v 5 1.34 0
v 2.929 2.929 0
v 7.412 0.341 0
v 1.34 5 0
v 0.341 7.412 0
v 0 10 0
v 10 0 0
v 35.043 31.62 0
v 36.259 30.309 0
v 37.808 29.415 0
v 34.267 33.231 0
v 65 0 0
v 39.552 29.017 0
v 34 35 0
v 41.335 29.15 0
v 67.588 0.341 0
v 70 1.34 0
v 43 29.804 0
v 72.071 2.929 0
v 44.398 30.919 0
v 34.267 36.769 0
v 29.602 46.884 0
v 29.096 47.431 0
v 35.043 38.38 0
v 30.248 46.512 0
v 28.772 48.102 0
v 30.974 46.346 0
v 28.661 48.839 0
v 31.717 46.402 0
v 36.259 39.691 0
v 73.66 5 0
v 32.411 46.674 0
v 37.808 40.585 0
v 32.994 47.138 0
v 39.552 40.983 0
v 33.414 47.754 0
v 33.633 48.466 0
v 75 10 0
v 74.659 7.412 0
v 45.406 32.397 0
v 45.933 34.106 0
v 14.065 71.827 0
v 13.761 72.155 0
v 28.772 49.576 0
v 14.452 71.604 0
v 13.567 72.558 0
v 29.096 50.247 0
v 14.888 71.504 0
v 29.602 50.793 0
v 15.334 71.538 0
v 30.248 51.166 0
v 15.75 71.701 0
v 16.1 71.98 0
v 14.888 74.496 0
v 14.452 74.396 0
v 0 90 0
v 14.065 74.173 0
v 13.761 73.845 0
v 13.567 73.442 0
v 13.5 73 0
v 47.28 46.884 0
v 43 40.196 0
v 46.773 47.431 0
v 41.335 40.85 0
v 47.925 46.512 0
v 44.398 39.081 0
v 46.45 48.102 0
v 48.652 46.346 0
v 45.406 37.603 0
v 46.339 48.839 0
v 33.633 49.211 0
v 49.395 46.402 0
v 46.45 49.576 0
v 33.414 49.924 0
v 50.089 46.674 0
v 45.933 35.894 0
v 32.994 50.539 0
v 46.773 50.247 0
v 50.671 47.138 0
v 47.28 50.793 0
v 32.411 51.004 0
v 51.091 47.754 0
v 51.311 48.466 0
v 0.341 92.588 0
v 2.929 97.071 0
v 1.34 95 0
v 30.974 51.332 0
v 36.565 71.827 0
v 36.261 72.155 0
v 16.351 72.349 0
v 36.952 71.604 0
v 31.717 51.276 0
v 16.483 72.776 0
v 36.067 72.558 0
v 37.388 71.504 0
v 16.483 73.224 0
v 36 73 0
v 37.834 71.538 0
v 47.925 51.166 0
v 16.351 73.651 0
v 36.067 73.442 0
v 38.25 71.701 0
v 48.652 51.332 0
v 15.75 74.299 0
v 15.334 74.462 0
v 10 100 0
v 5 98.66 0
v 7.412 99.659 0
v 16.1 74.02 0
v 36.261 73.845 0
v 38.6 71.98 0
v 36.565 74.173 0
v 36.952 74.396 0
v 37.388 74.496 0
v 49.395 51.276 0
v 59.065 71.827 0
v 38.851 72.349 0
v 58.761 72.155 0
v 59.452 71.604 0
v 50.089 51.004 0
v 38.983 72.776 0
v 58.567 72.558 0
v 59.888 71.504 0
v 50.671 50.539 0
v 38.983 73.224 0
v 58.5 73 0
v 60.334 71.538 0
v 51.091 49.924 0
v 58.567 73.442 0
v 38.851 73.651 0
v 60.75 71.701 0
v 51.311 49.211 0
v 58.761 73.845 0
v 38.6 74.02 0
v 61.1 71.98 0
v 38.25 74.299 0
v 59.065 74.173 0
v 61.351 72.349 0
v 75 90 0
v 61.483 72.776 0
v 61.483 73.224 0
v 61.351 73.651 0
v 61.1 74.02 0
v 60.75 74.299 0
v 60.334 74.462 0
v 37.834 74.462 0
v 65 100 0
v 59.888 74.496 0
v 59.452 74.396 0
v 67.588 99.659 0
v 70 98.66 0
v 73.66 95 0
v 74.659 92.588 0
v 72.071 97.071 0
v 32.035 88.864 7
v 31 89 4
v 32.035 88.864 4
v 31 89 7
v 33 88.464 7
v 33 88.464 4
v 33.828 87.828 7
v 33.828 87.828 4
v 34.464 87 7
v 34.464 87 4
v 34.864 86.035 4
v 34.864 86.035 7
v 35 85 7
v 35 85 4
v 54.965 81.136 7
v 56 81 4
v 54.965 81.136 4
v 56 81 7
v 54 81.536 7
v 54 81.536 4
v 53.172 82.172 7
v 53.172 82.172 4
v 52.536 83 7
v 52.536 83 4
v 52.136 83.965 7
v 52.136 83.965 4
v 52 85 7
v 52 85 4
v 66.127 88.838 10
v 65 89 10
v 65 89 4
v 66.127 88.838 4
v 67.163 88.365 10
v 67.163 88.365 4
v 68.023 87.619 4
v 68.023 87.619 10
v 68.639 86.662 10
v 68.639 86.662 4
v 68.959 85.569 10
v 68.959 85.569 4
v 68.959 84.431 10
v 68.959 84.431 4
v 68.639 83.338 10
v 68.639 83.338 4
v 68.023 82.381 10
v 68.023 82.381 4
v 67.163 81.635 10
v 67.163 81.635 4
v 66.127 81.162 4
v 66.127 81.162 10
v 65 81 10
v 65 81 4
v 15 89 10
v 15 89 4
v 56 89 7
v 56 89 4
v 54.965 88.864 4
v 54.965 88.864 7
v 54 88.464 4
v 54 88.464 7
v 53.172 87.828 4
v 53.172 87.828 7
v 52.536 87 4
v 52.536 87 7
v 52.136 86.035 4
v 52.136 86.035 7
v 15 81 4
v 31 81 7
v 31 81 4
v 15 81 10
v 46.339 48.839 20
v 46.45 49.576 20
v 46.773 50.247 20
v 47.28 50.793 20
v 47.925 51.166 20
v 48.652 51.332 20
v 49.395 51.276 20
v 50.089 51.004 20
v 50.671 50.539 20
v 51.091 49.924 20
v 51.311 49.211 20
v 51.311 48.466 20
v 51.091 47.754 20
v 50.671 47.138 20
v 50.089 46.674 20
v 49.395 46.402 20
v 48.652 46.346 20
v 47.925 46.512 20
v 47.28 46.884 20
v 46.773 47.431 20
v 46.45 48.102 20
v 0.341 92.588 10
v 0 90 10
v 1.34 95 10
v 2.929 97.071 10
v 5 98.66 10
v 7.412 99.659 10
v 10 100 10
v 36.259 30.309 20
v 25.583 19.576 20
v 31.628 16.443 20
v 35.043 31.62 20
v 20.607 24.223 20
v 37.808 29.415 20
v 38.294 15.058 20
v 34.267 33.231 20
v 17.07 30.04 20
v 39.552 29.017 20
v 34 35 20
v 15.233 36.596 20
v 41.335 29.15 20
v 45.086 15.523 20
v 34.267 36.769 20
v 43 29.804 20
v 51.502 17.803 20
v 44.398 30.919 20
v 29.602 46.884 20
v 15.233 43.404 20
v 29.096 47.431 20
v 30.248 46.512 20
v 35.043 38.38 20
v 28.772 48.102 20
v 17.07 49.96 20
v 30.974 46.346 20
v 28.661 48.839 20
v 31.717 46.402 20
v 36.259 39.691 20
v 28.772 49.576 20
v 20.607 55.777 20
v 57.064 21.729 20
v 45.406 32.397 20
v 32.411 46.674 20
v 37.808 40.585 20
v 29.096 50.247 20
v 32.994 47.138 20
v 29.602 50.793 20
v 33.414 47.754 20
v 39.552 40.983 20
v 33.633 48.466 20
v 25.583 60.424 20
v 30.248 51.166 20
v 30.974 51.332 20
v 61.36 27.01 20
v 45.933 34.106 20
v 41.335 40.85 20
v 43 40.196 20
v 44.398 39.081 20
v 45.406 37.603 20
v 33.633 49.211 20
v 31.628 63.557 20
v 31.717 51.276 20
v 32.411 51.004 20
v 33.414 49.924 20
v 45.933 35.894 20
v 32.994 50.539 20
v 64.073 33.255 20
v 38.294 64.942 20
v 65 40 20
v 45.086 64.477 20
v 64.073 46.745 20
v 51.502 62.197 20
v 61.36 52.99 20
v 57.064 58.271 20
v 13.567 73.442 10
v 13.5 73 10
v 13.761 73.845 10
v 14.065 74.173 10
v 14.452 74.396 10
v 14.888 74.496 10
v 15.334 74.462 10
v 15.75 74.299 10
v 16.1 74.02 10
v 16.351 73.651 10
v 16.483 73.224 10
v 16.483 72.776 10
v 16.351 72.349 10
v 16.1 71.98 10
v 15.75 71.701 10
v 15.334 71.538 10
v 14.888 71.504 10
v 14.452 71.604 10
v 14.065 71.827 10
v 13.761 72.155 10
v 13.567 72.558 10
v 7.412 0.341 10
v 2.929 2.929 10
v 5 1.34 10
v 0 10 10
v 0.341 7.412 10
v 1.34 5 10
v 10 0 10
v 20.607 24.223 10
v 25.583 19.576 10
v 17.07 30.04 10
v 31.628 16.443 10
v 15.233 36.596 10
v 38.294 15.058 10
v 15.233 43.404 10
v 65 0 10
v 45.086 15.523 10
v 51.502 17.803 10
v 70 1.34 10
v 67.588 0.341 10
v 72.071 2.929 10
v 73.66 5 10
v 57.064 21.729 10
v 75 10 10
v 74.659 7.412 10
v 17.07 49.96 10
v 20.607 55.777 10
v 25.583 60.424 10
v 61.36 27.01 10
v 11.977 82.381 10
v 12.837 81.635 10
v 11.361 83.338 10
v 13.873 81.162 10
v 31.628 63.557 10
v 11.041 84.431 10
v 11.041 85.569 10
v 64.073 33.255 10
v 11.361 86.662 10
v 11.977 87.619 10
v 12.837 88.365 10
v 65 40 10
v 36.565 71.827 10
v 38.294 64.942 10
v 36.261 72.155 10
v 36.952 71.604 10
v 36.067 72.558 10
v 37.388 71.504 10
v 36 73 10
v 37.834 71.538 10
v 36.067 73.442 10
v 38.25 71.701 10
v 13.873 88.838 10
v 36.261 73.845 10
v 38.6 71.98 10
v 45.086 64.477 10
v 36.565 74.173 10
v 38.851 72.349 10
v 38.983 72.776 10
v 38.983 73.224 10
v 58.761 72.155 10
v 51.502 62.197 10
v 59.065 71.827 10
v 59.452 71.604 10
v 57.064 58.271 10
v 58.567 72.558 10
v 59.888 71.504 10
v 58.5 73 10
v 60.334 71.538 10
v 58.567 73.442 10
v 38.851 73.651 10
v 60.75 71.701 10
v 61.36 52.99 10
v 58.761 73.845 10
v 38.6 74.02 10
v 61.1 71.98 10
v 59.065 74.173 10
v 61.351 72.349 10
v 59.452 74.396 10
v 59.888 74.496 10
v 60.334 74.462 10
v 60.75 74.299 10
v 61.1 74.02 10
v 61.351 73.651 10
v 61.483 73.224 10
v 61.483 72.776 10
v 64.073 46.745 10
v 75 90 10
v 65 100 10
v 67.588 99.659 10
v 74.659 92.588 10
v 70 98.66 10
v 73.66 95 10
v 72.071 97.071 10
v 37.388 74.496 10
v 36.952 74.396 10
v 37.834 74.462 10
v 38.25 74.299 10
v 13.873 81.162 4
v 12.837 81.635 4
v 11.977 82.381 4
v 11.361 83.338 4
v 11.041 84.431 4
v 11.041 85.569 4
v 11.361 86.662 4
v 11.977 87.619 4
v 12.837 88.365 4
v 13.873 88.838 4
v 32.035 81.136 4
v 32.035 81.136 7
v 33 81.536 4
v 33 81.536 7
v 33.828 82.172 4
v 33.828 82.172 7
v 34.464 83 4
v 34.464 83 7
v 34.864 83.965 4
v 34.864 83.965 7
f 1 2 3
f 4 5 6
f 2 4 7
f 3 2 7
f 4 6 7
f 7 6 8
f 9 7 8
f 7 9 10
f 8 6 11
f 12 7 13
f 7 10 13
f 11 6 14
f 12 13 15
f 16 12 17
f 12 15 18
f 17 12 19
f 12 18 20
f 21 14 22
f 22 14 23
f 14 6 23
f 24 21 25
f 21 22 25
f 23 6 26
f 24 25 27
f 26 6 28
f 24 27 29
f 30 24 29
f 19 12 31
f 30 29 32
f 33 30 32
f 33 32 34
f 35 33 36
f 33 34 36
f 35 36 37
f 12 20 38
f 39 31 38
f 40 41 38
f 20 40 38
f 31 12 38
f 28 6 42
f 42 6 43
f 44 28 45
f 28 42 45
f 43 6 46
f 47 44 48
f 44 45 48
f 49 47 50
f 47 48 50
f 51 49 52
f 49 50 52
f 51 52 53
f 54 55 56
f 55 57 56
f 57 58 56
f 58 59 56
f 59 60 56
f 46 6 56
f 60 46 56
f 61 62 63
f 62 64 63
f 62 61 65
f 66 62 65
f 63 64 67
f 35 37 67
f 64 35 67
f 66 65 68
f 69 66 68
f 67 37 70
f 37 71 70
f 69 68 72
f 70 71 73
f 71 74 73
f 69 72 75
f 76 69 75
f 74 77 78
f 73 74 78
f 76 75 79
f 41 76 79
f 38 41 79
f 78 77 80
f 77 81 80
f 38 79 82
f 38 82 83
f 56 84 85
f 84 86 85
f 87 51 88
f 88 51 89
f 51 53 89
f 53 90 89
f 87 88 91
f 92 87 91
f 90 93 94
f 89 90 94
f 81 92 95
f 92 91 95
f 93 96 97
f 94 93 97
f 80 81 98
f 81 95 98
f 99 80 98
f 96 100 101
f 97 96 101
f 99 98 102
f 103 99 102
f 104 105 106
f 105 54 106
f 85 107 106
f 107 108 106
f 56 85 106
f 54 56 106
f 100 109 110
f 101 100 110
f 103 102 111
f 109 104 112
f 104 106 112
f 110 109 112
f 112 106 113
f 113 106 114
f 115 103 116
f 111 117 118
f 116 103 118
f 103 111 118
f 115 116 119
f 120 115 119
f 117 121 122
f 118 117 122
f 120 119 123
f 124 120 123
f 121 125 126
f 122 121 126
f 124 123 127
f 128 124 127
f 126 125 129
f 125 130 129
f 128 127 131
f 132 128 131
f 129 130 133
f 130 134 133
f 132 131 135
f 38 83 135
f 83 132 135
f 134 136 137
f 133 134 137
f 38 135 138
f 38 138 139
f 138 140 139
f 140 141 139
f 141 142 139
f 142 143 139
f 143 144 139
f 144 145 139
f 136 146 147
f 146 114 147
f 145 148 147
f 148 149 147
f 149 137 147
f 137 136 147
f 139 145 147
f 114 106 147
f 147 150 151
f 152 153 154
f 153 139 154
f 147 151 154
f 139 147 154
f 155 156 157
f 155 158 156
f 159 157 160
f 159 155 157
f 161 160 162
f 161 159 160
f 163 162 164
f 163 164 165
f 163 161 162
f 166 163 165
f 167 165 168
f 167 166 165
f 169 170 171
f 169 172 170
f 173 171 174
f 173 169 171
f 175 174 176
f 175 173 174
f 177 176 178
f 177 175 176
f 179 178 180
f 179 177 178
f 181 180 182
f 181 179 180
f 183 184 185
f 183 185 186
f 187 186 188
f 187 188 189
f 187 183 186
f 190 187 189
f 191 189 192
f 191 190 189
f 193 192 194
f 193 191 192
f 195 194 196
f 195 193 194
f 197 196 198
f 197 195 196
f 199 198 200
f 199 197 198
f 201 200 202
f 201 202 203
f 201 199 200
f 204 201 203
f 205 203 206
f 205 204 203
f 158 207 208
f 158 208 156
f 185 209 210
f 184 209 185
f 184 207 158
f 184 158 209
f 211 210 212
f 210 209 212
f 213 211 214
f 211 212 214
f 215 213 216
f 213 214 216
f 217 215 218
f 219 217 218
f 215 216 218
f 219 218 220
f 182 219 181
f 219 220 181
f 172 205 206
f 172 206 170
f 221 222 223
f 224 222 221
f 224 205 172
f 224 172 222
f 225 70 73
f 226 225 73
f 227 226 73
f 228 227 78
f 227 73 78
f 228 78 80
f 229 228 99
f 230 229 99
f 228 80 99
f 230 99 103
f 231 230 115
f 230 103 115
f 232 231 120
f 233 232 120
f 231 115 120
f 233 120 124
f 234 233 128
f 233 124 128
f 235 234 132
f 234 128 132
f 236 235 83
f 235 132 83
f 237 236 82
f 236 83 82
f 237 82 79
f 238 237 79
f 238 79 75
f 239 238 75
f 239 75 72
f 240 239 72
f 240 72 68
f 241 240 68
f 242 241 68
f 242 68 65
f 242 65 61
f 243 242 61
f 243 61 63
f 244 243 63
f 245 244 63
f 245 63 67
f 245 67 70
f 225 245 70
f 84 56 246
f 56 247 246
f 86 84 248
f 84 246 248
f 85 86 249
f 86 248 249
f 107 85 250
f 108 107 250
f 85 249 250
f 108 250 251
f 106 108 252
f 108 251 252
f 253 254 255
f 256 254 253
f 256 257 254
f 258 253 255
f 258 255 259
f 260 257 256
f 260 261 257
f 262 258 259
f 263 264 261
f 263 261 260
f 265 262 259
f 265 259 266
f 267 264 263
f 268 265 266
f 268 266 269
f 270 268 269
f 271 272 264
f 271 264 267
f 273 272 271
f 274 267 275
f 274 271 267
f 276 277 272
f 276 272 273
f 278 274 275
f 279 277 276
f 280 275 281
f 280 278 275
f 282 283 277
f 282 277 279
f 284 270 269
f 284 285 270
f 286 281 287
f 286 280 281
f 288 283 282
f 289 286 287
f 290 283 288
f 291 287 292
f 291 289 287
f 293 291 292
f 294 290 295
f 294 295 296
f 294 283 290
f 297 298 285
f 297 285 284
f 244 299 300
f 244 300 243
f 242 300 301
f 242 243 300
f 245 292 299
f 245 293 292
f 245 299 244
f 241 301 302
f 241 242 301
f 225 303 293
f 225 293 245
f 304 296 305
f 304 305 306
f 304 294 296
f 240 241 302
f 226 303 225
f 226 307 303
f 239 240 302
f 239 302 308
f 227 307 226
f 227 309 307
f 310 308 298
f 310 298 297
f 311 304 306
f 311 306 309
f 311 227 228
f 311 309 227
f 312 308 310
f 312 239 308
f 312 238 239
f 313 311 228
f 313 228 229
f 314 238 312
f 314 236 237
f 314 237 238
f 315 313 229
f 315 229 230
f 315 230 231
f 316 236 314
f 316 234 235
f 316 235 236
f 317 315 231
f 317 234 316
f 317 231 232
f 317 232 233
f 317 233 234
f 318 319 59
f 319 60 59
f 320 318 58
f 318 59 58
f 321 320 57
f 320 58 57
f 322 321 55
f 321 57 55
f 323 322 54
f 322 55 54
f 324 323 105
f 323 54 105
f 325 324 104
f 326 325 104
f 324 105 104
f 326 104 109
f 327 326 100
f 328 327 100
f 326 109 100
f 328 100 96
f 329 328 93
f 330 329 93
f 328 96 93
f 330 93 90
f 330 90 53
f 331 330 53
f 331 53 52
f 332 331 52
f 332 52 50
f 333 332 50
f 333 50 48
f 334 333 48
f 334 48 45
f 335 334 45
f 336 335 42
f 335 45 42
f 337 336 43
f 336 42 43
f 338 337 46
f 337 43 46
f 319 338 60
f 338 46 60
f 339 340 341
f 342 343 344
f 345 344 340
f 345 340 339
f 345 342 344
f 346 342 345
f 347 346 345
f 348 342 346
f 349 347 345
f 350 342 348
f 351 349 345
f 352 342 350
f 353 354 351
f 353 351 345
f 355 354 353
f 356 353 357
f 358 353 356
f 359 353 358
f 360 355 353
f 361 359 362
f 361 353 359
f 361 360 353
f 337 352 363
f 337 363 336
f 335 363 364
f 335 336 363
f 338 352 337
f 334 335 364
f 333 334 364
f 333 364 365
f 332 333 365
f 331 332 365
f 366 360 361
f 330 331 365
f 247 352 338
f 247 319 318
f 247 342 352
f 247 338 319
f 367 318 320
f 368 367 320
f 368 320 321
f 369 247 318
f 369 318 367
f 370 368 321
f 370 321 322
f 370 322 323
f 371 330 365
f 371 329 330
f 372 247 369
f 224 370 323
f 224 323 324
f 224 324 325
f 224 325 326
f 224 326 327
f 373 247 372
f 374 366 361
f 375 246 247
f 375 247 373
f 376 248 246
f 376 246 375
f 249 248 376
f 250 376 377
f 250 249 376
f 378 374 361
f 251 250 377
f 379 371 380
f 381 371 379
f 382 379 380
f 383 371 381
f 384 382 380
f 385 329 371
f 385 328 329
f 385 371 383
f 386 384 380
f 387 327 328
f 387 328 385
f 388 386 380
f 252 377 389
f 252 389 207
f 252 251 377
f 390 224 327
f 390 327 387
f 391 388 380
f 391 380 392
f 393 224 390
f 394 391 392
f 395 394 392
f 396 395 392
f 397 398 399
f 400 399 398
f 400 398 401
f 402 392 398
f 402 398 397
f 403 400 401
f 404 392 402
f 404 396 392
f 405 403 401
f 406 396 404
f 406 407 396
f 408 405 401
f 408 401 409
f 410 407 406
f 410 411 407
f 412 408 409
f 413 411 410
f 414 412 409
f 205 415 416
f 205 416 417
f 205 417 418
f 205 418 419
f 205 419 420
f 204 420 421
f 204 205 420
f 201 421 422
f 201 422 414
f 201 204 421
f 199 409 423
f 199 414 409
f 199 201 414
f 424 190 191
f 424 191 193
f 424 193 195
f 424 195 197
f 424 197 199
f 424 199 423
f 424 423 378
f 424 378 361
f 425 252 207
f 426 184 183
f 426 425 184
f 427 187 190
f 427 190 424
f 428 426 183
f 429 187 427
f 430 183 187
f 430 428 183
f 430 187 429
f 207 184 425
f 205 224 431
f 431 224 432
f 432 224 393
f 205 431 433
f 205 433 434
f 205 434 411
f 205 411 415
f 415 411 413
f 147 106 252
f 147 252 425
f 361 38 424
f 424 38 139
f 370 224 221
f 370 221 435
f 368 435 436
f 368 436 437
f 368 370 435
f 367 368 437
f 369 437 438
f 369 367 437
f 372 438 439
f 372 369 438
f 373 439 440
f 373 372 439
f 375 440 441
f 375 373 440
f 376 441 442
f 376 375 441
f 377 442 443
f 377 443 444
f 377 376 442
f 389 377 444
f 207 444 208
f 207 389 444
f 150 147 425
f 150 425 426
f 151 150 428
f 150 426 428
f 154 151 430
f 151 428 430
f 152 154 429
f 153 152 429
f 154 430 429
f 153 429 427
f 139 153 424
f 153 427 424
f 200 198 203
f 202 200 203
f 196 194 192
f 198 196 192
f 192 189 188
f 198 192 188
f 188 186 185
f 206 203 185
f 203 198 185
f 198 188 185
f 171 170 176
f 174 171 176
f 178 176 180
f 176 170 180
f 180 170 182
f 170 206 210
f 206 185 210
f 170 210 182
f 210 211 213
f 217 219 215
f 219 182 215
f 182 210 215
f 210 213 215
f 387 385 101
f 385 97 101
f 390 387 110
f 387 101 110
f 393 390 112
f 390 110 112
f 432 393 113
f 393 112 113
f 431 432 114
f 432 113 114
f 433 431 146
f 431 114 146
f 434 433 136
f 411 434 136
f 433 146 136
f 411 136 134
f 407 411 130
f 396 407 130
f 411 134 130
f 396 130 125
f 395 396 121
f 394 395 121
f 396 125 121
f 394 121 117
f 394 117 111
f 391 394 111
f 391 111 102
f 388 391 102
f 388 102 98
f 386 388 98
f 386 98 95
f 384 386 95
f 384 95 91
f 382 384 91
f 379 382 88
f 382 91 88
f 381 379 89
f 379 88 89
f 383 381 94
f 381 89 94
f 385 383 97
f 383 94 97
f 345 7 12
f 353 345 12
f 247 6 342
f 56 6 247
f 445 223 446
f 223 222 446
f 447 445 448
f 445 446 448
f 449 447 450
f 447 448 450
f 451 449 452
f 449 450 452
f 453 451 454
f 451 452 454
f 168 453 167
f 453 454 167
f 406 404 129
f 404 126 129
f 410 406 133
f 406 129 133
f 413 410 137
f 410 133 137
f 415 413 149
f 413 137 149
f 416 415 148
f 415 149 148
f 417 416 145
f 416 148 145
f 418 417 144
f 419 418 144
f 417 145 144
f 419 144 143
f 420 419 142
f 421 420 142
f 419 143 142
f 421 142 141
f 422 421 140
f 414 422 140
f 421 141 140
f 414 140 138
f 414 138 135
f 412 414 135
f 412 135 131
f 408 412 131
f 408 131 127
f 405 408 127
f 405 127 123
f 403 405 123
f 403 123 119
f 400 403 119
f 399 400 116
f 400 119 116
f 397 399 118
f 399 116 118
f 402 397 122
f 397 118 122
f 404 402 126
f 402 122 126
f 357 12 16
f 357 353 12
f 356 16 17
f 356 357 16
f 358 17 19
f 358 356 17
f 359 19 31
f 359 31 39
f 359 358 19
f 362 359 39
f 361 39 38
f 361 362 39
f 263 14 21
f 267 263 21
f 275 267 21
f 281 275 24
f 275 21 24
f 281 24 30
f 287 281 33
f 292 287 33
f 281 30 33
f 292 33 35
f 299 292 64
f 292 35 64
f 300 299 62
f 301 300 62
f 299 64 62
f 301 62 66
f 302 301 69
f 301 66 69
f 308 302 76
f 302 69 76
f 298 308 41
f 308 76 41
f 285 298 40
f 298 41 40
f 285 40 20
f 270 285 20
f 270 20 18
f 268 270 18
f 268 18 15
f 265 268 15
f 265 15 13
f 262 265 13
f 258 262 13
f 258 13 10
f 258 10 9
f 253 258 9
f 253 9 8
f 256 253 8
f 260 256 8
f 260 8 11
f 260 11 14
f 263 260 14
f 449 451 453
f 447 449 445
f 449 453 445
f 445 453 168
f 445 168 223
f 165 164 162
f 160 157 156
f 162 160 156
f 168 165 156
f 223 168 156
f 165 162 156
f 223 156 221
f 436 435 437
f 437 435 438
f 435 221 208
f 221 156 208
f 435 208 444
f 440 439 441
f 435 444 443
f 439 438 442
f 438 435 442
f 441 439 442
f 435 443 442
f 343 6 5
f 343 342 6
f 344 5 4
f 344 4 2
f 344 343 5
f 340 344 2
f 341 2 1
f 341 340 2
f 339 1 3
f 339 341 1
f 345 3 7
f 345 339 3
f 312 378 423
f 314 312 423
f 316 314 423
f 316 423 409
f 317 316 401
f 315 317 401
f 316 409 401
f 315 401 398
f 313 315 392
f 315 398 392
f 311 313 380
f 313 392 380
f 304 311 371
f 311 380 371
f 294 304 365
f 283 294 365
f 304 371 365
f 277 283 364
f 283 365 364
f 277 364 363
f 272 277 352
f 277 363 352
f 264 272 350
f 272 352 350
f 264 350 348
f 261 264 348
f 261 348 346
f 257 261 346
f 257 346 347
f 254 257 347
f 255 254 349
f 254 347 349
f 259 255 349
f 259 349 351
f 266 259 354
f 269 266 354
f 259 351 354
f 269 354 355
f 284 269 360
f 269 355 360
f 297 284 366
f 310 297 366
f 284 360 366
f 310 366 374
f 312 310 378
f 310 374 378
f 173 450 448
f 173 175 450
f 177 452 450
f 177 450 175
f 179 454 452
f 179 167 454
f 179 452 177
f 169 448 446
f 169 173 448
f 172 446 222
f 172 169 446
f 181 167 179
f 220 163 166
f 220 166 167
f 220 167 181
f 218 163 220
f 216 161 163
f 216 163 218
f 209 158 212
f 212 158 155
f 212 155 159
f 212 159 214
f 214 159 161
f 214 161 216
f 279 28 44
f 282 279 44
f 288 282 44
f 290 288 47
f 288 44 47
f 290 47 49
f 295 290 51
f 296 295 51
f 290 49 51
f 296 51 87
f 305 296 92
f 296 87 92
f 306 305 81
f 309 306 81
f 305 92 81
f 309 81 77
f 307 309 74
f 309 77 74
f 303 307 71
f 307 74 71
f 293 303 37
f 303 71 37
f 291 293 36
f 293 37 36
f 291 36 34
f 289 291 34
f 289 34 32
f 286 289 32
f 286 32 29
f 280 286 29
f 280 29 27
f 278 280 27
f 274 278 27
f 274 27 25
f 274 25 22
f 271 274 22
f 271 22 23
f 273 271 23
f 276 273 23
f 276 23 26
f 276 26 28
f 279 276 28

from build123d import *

# Parameters (mm, degrees)
SKETCH2_W                    = 75
SKETCH2_H                    = 100
BOSS_EXTRUDE1_DEPTH          = 10
SKETCH5_R                    = 25
BOSS_EXTRUDE4_DEPTH          = 10
F_5_0_5_DIAMETER_HOLE1_D     = 5
F_12_0_12_DIAMETER_HOLE1_D   = 12
CUT_EXTRUDE1_DEPTH           = 6
FILLET1_R                    = 10
F_3_0_3_DIAMETER_HOLE1_D     = 3
F_3_0_3_DIAMETER_HOLE1_DEPTH = 10
F_3_0_3_DIAMETER_HOLE1_TIP   = 0.901290929
SKETCH18_W                   = 17
SKETCH18_H                   = 8
BOSS_EXTRUDE5_DEPTH          = 3
FILLET2_R                    = 4


with BuildPart() as part:
    # Sketch2 → Boss-Extrude1 (new body)
    with BuildSketch(Plane.XY):
        with Locations((37.5, 50)):
            Rectangle(SKETCH2_W, SKETCH2_H)
    extrude(amount=BOSS_EXTRUDE1_DEPTH)

    # Sketch5 → Boss-Extrude4 (add)
    with BuildSketch(Plane.XY.offset(10)):
        with Locations((40, 40)):
            Circle(SKETCH5_R)
    extrude(amount=BOSS_EXTRUDE4_DEPTH)

    # Ø5.0 (5) Diameter Hole1 (through all)
    with Locations(Plane.XY.offset(20)):
        with Locations((31.161165235, 48.838834765), (48.838834765, 48.838834765)):
            Hole(F_5_0_5_DIAMETER_HOLE1_D / 2)

    # Ø12.0 (12) Diameter Hole1 (through all)
    with Locations(Plane.XY.offset(20)):
        with Locations((40, 35)):
            Hole(F_12_0_12_DIAMETER_HOLE1_D / 2)

    # Sketch12 → Cut-Extrude1 (cut)
    with BuildSketch(Plane.XY.offset(10)):
        with BuildLine():
            Line((15, 89), (65, 89))
            ThreePointArc((65, 89), (69, 85), (65, 81))
            Line((65, 81), (15, 81))
            ThreePointArc((15, 81), (11, 85), (15, 89))
        make_face()
    extrude(amount=-CUT_EXTRUDE1_DEPTH, mode=Mode.SUBTRACT)

    # Fillet1
    fillet1_edges = [part.edges().sort_by_distance(p)[0] for p in [
        (0, 100, 5),
        (75, 100, 5),
        (75, 0, 5),
        (0, 0, 5),
    ]]
    fillet(fillet1_edges, radius=FILLET1_R)

    # Ø3.0 (3) Diameter Hole1
    with Locations(Plane.XY.offset(10)):
        with Locations((15, 73), (37.5, 73), (60, 73)):
            Hole(F_3_0_3_DIAMETER_HOLE1_D / 2, depth=F_3_0_3_DIAMETER_HOLE1_DEPTH)
            with Locations((0, 0, -(F_3_0_3_DIAMETER_HOLE1_DEPTH + F_3_0_3_DIAMETER_HOLE1_TIP / 2))):  # 118° drill point
                Cone(0, F_3_0_3_DIAMETER_HOLE1_D / 2, F_3_0_3_DIAMETER_HOLE1_TIP, mode=Mode.SUBTRACT)

    # Sketch18 → Boss-Extrude5 (add)
    with BuildSketch(Plane.XY.offset(4)):
        with Locations((43.5, 85)):
            Rectangle(SKETCH18_W, SKETCH18_H)
    extrude(amount=BOSS_EXTRUDE5_DEPTH)

    # Fillet2
    fillet2_edges = [part.edges().sort_by_distance(p)[0] for p in [
        (52, 81, 5.5),
        (52, 89, 5.5),
        (35, 81, 5.5),
        (35, 89, 5.5),
    ]]
    fillet(fillet2_edges, radius=FILLET2_R - 0.0001)  # a hair under: the kernel refuses the full size


solid = part.part
